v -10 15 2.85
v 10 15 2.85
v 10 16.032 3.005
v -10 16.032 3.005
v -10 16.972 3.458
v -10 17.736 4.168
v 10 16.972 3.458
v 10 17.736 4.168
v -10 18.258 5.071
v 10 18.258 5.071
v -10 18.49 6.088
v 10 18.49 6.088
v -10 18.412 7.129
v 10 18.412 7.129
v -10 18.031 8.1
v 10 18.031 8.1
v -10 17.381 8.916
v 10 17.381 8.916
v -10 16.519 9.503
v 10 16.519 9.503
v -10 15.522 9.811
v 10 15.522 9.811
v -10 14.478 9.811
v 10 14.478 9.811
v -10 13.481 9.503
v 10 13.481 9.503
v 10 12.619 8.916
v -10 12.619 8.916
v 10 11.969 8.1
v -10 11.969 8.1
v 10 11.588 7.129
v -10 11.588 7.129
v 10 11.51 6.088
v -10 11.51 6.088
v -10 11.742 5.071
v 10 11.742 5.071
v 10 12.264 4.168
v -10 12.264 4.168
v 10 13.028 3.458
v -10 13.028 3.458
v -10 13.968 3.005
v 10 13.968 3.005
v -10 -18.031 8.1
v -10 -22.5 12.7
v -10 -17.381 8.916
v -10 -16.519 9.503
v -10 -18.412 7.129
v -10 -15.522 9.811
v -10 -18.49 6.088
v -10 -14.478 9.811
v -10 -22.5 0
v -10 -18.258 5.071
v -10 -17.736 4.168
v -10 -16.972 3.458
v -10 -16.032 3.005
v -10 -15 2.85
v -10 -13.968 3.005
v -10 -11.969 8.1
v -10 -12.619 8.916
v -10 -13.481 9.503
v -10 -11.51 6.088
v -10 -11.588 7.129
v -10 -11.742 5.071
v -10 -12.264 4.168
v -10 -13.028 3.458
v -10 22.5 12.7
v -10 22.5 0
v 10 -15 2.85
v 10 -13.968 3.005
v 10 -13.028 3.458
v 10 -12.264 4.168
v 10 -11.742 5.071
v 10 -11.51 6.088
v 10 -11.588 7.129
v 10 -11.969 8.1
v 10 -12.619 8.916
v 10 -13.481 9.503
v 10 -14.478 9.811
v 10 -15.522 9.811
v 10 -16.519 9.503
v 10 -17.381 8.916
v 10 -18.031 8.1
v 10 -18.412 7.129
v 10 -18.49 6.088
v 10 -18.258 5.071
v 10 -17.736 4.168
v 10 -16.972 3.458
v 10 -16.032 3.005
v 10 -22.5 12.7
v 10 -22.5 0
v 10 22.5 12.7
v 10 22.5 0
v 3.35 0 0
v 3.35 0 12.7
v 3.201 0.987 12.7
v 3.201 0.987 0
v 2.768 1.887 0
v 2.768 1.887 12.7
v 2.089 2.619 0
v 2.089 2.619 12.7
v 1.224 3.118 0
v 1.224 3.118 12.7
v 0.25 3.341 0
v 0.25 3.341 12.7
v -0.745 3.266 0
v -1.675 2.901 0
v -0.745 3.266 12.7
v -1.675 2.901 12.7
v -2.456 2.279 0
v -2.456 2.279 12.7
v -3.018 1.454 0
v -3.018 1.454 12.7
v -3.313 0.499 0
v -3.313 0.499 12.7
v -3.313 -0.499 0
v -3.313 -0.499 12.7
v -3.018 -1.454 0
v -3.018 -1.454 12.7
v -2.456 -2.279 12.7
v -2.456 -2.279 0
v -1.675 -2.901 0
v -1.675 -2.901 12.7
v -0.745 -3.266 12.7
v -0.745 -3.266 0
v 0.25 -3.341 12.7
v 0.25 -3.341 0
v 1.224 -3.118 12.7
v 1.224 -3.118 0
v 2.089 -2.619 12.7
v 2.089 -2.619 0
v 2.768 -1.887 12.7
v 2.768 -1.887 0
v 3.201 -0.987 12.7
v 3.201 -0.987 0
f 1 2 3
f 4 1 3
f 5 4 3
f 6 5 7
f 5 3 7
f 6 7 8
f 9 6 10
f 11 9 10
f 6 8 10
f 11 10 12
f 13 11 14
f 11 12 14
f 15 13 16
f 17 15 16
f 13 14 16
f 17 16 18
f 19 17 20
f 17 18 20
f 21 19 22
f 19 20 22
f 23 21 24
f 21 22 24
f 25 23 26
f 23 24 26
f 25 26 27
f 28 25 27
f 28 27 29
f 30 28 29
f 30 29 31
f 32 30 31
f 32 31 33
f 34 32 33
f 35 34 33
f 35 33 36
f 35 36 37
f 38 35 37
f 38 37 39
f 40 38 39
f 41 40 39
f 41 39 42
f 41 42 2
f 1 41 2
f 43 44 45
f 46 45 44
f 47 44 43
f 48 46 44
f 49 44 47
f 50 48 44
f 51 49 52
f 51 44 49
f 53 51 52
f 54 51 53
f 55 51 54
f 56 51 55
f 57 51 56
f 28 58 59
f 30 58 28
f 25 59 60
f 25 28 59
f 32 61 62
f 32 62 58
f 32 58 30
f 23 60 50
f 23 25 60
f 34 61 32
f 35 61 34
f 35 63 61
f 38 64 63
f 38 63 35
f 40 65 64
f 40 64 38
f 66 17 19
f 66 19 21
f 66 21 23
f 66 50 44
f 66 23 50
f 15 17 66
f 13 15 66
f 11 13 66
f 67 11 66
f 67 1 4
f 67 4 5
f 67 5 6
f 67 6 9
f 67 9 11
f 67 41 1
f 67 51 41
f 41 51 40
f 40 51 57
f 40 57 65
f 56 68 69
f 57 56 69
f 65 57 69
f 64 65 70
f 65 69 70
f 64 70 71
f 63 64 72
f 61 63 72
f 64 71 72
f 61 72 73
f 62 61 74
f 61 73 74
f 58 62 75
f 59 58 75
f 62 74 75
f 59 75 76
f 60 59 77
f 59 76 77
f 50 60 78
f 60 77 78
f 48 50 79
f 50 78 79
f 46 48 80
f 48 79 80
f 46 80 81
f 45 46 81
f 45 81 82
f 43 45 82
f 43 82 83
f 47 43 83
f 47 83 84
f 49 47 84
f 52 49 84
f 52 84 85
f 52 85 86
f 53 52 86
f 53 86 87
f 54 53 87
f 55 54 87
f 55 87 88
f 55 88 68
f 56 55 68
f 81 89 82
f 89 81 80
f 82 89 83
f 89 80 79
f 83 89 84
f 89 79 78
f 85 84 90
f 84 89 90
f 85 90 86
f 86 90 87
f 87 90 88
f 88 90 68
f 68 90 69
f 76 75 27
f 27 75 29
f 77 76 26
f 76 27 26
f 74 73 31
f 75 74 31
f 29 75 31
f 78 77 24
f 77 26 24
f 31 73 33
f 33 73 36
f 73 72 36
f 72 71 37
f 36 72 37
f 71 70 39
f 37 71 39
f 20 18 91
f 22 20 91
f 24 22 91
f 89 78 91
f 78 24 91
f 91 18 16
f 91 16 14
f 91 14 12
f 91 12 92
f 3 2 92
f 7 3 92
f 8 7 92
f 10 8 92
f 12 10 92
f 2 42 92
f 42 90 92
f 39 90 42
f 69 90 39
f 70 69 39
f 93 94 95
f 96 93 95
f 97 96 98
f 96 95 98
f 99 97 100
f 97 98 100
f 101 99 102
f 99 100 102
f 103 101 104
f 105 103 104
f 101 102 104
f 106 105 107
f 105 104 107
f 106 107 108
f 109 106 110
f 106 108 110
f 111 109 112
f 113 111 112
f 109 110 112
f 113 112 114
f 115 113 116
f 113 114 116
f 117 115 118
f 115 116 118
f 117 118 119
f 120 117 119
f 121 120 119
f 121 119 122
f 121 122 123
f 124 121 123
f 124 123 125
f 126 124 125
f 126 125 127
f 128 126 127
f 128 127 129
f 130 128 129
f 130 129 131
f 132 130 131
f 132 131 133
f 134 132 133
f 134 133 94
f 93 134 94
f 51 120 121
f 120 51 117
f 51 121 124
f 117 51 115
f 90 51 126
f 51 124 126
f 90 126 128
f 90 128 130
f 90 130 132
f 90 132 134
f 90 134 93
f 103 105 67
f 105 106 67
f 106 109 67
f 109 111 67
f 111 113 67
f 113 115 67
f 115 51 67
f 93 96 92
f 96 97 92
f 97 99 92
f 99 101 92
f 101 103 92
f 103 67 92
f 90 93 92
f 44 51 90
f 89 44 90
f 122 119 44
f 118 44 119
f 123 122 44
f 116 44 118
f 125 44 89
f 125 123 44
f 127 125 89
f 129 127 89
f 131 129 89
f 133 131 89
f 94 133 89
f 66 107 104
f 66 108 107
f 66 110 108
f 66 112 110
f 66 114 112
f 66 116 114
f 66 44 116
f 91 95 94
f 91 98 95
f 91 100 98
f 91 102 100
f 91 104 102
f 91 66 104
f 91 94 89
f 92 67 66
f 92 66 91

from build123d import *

# Parameters (mm, degrees)
SKETCH1_W           = 20
SKETCH1_H           = 45
BOSS_EXTRUDE1_DEPTH = 12.7
SKETCH2_R           = 3.35
CUT_EXTRUDE1_DEPTH  = 28.704512268
SKETCH3_R           = 3.5
CUT_EXTRUDE2_DEPTH  = 33.673230633


with BuildPart() as part:
    # Sketch1 → Boss-Extrude1 (new body)
    with BuildSketch(Plane.XY):
        Rectangle(SKETCH1_W, SKETCH1_H)
    extrude(amount=BOSS_EXTRUDE1_DEPTH)

    # Sketch2 → Cut-Extrude1 (cut, through all)
    with BuildSketch(Plane.XY.offset(12.7)):
        Circle(SKETCH2_R)
    extrude(amount=-CUT_EXTRUDE1_DEPTH, mode=Mode.SUBTRACT)

    # Sketch3 → Cut-Extrude2 (cut, through all)
    with BuildSketch(Plane(origin=(10, 0, 0), x_dir=(0, 0, -1), z_dir=(1, 0, 0))):
        with Locations((-6.35, 15)):
            Circle(SKETCH3_R)
        with Locations((-6.35, -15)):
            Circle(SKETCH3_R)
    extrude(amount=-CUT_EXTRUDE2_DEPTH, mode=Mode.SUBTRACT)


solid = part.part
